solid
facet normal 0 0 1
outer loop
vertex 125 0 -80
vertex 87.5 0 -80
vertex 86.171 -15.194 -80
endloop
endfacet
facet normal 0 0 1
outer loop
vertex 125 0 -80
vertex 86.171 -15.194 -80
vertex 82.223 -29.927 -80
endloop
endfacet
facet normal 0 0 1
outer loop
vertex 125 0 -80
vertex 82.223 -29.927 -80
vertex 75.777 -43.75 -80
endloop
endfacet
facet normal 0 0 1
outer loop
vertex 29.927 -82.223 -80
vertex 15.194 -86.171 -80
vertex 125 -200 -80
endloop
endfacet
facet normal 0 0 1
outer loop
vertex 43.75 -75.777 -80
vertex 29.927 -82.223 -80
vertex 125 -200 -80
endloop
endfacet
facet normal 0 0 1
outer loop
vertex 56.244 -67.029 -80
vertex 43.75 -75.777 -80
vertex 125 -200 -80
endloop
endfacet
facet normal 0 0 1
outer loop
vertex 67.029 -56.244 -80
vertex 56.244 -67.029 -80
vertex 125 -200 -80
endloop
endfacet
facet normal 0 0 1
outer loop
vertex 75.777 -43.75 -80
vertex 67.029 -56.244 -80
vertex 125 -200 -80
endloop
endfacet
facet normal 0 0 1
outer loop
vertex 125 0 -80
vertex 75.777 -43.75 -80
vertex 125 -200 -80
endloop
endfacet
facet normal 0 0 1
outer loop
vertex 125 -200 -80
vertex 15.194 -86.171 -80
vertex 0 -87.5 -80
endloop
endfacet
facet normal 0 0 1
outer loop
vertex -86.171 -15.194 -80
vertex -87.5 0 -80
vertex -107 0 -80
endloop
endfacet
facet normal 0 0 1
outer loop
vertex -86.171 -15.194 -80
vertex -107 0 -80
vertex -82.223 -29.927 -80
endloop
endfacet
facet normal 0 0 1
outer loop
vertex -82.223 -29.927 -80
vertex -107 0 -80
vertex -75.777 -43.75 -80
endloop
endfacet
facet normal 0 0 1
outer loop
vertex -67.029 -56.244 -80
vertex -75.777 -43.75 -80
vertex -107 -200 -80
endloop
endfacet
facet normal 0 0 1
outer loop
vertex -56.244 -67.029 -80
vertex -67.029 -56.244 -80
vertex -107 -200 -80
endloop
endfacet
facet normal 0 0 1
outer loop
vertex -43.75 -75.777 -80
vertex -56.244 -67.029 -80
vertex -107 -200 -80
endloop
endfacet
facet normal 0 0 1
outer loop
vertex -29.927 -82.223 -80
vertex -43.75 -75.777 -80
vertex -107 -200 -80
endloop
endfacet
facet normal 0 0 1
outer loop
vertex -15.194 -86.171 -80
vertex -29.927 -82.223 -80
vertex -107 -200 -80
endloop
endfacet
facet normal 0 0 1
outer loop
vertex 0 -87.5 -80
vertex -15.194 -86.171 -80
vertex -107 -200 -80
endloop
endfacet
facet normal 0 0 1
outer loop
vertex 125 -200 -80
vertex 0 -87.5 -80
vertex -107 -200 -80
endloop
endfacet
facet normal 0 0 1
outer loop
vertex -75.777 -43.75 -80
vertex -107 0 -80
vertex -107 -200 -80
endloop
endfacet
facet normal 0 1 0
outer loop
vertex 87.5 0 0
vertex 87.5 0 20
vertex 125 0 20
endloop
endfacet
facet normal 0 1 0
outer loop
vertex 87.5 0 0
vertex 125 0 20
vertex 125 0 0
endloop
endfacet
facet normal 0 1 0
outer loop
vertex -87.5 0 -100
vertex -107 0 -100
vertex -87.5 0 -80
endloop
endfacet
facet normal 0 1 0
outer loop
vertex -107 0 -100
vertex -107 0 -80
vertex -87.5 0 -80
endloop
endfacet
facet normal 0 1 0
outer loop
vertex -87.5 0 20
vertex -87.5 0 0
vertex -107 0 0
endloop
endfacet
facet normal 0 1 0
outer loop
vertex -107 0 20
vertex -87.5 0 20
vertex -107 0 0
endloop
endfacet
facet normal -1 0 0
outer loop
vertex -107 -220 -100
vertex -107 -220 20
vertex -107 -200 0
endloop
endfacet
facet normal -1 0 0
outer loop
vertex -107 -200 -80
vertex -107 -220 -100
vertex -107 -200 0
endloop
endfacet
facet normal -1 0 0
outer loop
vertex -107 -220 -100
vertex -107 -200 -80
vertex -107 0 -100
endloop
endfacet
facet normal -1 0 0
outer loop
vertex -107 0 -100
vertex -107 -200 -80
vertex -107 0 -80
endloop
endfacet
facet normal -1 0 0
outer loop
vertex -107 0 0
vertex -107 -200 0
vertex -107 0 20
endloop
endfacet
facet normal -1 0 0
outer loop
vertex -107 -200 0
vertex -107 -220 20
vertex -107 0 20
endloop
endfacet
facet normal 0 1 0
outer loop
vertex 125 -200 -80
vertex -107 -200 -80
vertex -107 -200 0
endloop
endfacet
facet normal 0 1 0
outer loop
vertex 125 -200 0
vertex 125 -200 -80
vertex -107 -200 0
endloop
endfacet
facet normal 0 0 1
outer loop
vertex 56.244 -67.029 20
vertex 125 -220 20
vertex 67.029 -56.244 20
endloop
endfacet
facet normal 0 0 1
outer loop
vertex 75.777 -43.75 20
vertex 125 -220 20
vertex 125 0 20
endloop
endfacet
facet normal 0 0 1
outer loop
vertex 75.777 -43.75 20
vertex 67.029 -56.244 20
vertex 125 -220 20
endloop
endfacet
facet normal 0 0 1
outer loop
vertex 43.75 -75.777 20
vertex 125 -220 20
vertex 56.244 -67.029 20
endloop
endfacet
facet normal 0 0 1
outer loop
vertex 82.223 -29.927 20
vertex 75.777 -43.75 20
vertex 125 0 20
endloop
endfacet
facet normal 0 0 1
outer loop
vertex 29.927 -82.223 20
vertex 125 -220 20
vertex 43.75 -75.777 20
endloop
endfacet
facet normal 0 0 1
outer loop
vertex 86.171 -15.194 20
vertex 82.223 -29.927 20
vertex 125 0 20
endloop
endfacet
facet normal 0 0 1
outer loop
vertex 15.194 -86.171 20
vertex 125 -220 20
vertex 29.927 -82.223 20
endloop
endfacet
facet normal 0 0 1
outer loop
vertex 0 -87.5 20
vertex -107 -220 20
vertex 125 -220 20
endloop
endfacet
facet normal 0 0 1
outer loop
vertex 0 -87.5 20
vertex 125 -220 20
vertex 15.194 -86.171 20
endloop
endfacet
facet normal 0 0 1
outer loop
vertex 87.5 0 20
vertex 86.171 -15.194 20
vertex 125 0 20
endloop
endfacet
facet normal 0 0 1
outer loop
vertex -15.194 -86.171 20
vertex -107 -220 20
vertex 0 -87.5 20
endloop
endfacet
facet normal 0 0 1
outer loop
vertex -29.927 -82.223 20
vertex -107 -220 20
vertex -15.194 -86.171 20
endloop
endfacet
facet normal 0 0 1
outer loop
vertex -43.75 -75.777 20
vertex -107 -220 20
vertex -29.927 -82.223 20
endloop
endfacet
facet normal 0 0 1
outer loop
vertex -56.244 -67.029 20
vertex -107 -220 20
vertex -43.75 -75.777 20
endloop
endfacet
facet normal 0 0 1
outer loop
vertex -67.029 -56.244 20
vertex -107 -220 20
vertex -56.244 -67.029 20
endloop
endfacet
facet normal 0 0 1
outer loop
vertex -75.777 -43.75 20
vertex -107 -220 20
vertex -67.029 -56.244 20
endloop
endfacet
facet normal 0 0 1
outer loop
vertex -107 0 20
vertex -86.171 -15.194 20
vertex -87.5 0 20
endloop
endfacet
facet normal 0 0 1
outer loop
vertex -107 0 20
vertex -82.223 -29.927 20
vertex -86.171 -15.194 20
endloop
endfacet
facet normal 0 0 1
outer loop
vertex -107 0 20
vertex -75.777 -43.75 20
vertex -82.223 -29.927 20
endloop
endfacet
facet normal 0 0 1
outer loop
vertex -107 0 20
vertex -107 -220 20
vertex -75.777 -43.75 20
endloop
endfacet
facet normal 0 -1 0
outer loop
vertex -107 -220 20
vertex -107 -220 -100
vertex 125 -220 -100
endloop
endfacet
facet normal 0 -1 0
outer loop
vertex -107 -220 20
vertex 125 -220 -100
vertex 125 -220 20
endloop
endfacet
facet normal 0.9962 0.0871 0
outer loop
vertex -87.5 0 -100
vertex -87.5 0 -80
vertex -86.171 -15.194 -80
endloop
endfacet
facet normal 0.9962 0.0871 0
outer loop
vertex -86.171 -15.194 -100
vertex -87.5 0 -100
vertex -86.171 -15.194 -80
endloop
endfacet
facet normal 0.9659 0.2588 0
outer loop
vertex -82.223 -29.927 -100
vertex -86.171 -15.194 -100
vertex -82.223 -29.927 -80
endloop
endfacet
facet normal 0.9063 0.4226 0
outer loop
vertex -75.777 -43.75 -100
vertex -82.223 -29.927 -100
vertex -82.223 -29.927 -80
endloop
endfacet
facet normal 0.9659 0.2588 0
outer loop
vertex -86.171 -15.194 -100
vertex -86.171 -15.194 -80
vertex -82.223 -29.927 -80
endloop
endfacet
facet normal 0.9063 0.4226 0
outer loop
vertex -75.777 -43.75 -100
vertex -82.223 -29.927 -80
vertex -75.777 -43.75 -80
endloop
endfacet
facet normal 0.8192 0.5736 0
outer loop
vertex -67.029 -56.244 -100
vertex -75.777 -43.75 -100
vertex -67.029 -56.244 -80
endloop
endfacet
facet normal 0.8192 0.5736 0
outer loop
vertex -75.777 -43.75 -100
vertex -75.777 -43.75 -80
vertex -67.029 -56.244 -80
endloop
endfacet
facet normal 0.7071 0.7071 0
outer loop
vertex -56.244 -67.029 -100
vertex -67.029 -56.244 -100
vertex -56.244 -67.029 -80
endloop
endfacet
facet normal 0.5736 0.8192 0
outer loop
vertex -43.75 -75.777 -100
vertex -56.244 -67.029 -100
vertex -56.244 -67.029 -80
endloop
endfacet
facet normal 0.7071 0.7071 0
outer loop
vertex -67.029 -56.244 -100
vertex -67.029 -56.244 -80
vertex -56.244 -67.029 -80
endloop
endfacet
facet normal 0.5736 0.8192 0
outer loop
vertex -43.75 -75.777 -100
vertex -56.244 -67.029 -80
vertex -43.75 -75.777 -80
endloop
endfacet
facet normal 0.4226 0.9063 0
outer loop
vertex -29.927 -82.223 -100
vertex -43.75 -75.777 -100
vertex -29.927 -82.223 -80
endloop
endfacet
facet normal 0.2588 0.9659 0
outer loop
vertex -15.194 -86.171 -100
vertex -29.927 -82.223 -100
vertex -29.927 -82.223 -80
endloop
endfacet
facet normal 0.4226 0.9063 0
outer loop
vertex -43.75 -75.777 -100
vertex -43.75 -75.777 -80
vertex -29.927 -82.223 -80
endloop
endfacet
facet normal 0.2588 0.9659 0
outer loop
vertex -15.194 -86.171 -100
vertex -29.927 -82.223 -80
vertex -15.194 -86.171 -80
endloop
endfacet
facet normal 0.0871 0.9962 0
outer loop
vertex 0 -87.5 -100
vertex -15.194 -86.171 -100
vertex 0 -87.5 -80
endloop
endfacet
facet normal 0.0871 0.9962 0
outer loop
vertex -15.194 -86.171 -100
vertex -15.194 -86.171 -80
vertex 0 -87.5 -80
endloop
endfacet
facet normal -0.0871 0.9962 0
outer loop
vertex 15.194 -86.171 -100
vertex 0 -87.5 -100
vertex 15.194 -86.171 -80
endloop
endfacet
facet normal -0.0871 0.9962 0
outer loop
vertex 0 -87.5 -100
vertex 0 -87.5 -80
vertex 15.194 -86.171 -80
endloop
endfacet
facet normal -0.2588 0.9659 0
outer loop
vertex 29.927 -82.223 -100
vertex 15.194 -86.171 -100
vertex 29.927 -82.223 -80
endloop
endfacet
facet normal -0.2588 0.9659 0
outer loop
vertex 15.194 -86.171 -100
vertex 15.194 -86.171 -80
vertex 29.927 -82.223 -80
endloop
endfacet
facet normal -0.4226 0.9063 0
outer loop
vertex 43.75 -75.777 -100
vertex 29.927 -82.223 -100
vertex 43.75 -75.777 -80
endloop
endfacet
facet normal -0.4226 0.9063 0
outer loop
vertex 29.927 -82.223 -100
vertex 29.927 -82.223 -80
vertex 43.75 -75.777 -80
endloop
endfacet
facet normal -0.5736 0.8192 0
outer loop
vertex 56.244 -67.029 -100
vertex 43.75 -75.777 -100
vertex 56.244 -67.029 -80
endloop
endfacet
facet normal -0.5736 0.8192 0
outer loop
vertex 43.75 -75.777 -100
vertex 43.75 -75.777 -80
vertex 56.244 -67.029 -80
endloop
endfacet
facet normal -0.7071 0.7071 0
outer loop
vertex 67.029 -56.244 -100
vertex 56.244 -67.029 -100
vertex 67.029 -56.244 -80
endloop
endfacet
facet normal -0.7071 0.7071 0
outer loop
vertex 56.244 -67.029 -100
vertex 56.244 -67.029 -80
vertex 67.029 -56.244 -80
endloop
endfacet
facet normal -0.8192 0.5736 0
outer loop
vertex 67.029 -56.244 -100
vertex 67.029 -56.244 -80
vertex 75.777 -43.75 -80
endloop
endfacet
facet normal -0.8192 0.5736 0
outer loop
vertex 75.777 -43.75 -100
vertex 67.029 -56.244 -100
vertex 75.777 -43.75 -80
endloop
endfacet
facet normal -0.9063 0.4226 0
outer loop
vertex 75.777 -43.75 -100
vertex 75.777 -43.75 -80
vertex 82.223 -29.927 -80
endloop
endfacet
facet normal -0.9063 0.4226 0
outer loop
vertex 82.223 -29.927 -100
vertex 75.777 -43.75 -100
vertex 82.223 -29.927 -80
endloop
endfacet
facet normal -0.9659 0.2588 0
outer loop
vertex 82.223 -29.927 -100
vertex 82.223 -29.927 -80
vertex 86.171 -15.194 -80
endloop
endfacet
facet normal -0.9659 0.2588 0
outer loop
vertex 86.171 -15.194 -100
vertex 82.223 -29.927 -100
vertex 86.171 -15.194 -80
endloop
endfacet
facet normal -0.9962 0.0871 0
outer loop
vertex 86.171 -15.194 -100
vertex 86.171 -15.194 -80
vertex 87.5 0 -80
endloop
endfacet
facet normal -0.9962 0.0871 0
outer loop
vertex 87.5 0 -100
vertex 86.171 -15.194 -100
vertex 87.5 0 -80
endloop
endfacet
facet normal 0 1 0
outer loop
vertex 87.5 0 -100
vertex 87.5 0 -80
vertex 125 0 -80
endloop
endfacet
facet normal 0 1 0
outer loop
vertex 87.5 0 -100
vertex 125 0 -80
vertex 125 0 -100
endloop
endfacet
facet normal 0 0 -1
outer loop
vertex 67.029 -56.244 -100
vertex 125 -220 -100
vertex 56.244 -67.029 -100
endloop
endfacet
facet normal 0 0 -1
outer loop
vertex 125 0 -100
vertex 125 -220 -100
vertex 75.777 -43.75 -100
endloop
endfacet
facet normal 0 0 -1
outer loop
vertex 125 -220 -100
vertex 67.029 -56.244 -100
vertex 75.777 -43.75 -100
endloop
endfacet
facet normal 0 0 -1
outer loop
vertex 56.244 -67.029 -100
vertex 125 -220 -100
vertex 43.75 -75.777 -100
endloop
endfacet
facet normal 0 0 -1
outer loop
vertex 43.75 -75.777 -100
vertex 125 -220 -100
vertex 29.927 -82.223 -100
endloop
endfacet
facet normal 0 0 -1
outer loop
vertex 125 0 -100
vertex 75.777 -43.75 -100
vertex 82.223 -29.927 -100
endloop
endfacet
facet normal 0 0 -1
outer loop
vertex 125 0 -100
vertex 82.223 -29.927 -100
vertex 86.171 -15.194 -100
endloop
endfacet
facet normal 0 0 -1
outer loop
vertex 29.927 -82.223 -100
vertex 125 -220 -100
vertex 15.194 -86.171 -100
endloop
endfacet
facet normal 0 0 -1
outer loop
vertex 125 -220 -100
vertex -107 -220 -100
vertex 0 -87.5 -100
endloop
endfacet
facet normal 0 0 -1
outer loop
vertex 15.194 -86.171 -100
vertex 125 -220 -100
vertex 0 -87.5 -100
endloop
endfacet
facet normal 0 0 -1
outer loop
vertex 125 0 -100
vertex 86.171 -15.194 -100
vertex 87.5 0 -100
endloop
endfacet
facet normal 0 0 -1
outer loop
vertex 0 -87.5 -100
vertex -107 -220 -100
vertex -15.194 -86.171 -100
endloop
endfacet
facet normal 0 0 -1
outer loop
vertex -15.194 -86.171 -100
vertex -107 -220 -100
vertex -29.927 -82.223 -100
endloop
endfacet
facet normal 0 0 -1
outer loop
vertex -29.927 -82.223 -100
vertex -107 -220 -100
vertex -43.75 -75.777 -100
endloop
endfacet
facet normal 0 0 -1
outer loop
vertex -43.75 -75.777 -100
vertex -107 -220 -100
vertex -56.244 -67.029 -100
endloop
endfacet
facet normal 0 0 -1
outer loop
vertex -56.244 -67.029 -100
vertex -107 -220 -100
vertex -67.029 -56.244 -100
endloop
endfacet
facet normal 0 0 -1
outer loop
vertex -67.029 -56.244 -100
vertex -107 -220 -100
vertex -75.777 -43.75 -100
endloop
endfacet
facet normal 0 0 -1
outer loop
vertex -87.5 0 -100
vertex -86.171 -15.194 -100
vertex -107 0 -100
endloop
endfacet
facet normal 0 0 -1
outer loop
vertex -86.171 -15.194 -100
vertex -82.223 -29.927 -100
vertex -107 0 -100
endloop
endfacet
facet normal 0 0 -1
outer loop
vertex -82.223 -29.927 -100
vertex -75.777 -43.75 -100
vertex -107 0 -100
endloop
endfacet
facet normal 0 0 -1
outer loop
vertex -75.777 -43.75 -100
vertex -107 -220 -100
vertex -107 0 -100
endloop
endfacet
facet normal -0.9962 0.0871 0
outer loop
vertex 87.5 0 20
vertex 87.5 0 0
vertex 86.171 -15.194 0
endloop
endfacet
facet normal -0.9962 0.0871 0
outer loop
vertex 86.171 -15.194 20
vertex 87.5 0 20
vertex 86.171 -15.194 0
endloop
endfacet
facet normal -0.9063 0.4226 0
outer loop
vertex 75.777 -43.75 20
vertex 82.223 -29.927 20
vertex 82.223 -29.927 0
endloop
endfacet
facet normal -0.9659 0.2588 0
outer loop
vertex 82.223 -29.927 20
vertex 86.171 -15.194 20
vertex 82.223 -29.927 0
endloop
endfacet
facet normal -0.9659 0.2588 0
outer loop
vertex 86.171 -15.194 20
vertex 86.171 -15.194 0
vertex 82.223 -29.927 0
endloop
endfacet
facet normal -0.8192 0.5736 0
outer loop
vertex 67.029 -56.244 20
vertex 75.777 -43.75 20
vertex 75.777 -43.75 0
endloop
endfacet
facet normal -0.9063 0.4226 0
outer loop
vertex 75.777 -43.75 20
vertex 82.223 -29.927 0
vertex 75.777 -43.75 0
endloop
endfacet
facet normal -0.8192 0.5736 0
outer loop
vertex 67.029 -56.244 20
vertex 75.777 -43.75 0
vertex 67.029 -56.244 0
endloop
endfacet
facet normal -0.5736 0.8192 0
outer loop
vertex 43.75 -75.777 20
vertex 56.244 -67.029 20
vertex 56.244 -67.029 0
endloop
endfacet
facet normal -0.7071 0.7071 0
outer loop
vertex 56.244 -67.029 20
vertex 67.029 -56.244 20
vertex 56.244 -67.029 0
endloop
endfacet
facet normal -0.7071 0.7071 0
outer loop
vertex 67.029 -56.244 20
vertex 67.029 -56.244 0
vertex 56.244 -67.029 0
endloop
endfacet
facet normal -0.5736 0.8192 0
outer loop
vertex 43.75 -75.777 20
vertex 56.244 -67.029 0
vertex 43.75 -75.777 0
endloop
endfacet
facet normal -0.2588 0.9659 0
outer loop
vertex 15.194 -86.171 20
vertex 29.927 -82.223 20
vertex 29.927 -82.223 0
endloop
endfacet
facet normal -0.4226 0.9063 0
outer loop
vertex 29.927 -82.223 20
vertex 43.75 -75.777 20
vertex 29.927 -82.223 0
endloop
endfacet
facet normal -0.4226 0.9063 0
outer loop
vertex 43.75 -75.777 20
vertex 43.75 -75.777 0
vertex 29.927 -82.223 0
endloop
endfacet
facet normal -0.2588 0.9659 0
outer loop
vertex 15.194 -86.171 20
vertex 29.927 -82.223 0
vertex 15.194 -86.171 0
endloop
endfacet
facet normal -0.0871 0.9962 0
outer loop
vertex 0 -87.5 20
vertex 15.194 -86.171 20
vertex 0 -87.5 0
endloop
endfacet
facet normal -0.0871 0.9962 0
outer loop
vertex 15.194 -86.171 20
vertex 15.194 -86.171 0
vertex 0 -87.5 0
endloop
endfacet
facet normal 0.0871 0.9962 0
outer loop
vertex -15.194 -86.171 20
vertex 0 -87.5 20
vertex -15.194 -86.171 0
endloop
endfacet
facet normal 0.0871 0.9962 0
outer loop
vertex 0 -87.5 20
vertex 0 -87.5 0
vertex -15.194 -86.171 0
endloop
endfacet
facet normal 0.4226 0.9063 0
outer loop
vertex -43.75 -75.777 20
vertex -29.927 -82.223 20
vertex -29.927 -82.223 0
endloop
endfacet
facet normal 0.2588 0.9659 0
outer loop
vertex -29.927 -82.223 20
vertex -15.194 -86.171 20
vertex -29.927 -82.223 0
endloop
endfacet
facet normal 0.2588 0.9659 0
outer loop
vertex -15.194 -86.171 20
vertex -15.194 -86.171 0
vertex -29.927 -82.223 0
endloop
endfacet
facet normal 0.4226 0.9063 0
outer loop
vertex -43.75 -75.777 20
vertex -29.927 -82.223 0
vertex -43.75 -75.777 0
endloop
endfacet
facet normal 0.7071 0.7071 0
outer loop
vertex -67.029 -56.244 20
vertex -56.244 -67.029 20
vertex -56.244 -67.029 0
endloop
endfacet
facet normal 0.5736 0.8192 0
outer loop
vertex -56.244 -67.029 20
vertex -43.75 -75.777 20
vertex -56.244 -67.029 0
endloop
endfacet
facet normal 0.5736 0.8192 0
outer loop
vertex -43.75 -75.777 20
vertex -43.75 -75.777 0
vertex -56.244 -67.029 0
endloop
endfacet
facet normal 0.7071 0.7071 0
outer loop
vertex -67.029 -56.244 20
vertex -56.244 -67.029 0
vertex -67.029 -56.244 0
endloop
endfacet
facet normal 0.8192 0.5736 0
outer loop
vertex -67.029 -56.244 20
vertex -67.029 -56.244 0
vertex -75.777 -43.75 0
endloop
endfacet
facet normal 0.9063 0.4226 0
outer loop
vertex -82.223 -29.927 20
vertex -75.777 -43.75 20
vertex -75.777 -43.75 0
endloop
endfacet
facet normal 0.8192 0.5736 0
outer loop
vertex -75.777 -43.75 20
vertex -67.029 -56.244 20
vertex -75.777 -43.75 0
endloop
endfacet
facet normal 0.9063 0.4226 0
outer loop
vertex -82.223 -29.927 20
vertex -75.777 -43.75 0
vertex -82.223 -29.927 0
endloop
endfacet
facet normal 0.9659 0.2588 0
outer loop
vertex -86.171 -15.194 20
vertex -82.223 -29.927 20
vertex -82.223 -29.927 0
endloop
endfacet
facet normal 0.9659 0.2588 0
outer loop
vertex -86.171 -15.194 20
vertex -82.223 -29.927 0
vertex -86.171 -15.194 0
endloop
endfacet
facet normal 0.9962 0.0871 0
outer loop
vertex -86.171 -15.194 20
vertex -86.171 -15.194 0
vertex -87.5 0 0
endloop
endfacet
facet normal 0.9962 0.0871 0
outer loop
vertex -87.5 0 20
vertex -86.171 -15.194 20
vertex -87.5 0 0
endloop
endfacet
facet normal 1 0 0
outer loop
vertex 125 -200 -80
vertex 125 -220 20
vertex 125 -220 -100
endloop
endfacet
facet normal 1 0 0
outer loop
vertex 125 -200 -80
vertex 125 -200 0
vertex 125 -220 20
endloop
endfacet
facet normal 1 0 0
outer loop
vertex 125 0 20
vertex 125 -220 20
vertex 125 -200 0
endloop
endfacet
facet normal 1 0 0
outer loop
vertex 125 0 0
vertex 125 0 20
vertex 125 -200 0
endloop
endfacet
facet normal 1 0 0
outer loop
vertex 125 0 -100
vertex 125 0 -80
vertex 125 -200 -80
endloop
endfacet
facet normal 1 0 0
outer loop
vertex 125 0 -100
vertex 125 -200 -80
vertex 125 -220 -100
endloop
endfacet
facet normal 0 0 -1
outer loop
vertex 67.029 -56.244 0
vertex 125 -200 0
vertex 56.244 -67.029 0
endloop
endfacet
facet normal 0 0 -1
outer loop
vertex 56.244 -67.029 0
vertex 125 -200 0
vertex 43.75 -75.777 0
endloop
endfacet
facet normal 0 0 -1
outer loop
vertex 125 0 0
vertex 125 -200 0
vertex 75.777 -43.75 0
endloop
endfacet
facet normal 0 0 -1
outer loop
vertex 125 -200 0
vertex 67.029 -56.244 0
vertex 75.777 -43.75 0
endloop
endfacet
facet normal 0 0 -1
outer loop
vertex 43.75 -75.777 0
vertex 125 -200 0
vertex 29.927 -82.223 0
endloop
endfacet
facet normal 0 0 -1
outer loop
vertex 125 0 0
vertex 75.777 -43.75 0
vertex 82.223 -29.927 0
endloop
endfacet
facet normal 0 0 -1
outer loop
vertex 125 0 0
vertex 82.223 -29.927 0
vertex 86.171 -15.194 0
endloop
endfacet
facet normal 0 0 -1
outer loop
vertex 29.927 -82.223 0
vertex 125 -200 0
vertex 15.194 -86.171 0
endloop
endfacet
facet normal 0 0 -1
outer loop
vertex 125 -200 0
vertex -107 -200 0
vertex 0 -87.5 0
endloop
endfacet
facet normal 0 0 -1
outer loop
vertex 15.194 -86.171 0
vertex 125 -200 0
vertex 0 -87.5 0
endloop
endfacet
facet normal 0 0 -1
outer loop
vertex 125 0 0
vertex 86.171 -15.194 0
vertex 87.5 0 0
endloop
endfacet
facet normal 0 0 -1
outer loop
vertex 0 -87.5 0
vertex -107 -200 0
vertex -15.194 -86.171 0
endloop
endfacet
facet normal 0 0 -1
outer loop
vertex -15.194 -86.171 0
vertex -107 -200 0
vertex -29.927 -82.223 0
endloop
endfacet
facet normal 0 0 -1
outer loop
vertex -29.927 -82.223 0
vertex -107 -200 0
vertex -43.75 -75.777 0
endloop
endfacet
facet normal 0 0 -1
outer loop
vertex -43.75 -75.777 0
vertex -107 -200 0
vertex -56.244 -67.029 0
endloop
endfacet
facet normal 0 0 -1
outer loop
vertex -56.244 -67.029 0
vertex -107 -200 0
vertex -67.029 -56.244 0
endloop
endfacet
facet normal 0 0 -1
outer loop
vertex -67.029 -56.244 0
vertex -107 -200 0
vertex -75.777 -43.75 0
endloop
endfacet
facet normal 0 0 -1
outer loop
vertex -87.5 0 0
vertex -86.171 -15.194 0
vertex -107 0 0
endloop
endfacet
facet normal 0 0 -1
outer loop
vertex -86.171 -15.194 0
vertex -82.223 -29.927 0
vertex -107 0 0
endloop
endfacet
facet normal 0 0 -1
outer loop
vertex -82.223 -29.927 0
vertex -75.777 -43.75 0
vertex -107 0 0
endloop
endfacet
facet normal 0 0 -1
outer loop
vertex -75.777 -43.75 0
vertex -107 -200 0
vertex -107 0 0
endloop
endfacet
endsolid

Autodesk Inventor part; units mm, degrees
ref_plane "YZ Plane" through (0, 0, 0) normal (1, 0, 0) x (0, 1, 0)
ref_plane "XZ Plane" through (0, 0, 0) normal (0, 1, 0) x (-1, 0, 0)
sketch "Sketch1" plane through (0, 0, 0) normal (0, 0, 1) x (1, 0, 0)
  arc A0 (-87.5, 0) -> (87.5, 0) centre (0, 0) ccw
  line L0 (-87.5, 0) -> (87.5, 0) construction
  line L1 (-87.5, -200) -> (87.5, -200)
  line L2 (-87.5, -220) -> (87.5, -220)
  line L3 (-87.5, 0) -> (-107.5, 0)
  line L4 (0, 0) -> (-107, 0)
  line L5 (-107, 0) -> (-107, -200)
  line L6 (-107, -200) -> (-87.5, -200)
  line L7 (-107, -200) -> (-107, -220)
  line L8 (-107, -220) -> (-87.5, -220)
  line L9 (0, 0) -> (107, 0)
  line L10 (107, 0) -> (107, -220)
  line L11 (107, -220) -> (87.5, -220)
  line L12 (87.5, -200) -> (107, -200)
  point P0 (87.5, 0)
  dimension "d0" = 175
  dimension "d1" = 200
  dimension "d9" = 107
  dimension "d10" = 107
  dimension "d13" = 90
  dimension "d15" = 200
  dimension "d17" = 200
  dimension "d18" = 214.5
  dimension "d21" = 20
extrude "Extrusion1" add sketch "Sketch1" along normal blind 20 contours A0 L9 L10 L12 L1 L6 L5 L3
extrude "Extrusion2" add sketch "Sketch1" along normal blind 20 and the other way blind 100 contours L6 L1 L12 L10 L11 L2 L8 L7
ref_plane "Work Plane1" through (0, 0, -40) normal (0, 0, -1) x (1, 0, 0)
mirror "Mirror1" about plane through (0, 0, -40) normal (0, 0, -1) of "Extrusion1"
sketch "Sketch2" plane through (107, 0, 20) normal (1, 0, 0) x (0, 0, -1)
  line L0 (120, -220) -> (0, -220) projected
  line L1 (0, -220) -> (0, 0) projected
  line L2 (0, 0) -> (20, 0)
  line L3 (20, -200) -> (20, 0) projected
  line L4 (20, 0) -> (20, -200)
  line L5 (100, -200) -> (20, -200) projected
  line L6 (20, -200) -> (100, -200)
  line L7 (100, 0) -> (100, -200) projected
  line L8 (100, -200) -> (100, 0)
  line L9 (120, -220) -> (120, 0) projected
  line L10 (100, 0) -> (120, 0)
  line L11 (120, 0) -> (120, -220)
  line L12 (120, -220) -> (0, -220)
extrude "Extrusion3" add sketch "Sketch2" along normal blind 18
properties part number "Support" material "Stainless Steel"
